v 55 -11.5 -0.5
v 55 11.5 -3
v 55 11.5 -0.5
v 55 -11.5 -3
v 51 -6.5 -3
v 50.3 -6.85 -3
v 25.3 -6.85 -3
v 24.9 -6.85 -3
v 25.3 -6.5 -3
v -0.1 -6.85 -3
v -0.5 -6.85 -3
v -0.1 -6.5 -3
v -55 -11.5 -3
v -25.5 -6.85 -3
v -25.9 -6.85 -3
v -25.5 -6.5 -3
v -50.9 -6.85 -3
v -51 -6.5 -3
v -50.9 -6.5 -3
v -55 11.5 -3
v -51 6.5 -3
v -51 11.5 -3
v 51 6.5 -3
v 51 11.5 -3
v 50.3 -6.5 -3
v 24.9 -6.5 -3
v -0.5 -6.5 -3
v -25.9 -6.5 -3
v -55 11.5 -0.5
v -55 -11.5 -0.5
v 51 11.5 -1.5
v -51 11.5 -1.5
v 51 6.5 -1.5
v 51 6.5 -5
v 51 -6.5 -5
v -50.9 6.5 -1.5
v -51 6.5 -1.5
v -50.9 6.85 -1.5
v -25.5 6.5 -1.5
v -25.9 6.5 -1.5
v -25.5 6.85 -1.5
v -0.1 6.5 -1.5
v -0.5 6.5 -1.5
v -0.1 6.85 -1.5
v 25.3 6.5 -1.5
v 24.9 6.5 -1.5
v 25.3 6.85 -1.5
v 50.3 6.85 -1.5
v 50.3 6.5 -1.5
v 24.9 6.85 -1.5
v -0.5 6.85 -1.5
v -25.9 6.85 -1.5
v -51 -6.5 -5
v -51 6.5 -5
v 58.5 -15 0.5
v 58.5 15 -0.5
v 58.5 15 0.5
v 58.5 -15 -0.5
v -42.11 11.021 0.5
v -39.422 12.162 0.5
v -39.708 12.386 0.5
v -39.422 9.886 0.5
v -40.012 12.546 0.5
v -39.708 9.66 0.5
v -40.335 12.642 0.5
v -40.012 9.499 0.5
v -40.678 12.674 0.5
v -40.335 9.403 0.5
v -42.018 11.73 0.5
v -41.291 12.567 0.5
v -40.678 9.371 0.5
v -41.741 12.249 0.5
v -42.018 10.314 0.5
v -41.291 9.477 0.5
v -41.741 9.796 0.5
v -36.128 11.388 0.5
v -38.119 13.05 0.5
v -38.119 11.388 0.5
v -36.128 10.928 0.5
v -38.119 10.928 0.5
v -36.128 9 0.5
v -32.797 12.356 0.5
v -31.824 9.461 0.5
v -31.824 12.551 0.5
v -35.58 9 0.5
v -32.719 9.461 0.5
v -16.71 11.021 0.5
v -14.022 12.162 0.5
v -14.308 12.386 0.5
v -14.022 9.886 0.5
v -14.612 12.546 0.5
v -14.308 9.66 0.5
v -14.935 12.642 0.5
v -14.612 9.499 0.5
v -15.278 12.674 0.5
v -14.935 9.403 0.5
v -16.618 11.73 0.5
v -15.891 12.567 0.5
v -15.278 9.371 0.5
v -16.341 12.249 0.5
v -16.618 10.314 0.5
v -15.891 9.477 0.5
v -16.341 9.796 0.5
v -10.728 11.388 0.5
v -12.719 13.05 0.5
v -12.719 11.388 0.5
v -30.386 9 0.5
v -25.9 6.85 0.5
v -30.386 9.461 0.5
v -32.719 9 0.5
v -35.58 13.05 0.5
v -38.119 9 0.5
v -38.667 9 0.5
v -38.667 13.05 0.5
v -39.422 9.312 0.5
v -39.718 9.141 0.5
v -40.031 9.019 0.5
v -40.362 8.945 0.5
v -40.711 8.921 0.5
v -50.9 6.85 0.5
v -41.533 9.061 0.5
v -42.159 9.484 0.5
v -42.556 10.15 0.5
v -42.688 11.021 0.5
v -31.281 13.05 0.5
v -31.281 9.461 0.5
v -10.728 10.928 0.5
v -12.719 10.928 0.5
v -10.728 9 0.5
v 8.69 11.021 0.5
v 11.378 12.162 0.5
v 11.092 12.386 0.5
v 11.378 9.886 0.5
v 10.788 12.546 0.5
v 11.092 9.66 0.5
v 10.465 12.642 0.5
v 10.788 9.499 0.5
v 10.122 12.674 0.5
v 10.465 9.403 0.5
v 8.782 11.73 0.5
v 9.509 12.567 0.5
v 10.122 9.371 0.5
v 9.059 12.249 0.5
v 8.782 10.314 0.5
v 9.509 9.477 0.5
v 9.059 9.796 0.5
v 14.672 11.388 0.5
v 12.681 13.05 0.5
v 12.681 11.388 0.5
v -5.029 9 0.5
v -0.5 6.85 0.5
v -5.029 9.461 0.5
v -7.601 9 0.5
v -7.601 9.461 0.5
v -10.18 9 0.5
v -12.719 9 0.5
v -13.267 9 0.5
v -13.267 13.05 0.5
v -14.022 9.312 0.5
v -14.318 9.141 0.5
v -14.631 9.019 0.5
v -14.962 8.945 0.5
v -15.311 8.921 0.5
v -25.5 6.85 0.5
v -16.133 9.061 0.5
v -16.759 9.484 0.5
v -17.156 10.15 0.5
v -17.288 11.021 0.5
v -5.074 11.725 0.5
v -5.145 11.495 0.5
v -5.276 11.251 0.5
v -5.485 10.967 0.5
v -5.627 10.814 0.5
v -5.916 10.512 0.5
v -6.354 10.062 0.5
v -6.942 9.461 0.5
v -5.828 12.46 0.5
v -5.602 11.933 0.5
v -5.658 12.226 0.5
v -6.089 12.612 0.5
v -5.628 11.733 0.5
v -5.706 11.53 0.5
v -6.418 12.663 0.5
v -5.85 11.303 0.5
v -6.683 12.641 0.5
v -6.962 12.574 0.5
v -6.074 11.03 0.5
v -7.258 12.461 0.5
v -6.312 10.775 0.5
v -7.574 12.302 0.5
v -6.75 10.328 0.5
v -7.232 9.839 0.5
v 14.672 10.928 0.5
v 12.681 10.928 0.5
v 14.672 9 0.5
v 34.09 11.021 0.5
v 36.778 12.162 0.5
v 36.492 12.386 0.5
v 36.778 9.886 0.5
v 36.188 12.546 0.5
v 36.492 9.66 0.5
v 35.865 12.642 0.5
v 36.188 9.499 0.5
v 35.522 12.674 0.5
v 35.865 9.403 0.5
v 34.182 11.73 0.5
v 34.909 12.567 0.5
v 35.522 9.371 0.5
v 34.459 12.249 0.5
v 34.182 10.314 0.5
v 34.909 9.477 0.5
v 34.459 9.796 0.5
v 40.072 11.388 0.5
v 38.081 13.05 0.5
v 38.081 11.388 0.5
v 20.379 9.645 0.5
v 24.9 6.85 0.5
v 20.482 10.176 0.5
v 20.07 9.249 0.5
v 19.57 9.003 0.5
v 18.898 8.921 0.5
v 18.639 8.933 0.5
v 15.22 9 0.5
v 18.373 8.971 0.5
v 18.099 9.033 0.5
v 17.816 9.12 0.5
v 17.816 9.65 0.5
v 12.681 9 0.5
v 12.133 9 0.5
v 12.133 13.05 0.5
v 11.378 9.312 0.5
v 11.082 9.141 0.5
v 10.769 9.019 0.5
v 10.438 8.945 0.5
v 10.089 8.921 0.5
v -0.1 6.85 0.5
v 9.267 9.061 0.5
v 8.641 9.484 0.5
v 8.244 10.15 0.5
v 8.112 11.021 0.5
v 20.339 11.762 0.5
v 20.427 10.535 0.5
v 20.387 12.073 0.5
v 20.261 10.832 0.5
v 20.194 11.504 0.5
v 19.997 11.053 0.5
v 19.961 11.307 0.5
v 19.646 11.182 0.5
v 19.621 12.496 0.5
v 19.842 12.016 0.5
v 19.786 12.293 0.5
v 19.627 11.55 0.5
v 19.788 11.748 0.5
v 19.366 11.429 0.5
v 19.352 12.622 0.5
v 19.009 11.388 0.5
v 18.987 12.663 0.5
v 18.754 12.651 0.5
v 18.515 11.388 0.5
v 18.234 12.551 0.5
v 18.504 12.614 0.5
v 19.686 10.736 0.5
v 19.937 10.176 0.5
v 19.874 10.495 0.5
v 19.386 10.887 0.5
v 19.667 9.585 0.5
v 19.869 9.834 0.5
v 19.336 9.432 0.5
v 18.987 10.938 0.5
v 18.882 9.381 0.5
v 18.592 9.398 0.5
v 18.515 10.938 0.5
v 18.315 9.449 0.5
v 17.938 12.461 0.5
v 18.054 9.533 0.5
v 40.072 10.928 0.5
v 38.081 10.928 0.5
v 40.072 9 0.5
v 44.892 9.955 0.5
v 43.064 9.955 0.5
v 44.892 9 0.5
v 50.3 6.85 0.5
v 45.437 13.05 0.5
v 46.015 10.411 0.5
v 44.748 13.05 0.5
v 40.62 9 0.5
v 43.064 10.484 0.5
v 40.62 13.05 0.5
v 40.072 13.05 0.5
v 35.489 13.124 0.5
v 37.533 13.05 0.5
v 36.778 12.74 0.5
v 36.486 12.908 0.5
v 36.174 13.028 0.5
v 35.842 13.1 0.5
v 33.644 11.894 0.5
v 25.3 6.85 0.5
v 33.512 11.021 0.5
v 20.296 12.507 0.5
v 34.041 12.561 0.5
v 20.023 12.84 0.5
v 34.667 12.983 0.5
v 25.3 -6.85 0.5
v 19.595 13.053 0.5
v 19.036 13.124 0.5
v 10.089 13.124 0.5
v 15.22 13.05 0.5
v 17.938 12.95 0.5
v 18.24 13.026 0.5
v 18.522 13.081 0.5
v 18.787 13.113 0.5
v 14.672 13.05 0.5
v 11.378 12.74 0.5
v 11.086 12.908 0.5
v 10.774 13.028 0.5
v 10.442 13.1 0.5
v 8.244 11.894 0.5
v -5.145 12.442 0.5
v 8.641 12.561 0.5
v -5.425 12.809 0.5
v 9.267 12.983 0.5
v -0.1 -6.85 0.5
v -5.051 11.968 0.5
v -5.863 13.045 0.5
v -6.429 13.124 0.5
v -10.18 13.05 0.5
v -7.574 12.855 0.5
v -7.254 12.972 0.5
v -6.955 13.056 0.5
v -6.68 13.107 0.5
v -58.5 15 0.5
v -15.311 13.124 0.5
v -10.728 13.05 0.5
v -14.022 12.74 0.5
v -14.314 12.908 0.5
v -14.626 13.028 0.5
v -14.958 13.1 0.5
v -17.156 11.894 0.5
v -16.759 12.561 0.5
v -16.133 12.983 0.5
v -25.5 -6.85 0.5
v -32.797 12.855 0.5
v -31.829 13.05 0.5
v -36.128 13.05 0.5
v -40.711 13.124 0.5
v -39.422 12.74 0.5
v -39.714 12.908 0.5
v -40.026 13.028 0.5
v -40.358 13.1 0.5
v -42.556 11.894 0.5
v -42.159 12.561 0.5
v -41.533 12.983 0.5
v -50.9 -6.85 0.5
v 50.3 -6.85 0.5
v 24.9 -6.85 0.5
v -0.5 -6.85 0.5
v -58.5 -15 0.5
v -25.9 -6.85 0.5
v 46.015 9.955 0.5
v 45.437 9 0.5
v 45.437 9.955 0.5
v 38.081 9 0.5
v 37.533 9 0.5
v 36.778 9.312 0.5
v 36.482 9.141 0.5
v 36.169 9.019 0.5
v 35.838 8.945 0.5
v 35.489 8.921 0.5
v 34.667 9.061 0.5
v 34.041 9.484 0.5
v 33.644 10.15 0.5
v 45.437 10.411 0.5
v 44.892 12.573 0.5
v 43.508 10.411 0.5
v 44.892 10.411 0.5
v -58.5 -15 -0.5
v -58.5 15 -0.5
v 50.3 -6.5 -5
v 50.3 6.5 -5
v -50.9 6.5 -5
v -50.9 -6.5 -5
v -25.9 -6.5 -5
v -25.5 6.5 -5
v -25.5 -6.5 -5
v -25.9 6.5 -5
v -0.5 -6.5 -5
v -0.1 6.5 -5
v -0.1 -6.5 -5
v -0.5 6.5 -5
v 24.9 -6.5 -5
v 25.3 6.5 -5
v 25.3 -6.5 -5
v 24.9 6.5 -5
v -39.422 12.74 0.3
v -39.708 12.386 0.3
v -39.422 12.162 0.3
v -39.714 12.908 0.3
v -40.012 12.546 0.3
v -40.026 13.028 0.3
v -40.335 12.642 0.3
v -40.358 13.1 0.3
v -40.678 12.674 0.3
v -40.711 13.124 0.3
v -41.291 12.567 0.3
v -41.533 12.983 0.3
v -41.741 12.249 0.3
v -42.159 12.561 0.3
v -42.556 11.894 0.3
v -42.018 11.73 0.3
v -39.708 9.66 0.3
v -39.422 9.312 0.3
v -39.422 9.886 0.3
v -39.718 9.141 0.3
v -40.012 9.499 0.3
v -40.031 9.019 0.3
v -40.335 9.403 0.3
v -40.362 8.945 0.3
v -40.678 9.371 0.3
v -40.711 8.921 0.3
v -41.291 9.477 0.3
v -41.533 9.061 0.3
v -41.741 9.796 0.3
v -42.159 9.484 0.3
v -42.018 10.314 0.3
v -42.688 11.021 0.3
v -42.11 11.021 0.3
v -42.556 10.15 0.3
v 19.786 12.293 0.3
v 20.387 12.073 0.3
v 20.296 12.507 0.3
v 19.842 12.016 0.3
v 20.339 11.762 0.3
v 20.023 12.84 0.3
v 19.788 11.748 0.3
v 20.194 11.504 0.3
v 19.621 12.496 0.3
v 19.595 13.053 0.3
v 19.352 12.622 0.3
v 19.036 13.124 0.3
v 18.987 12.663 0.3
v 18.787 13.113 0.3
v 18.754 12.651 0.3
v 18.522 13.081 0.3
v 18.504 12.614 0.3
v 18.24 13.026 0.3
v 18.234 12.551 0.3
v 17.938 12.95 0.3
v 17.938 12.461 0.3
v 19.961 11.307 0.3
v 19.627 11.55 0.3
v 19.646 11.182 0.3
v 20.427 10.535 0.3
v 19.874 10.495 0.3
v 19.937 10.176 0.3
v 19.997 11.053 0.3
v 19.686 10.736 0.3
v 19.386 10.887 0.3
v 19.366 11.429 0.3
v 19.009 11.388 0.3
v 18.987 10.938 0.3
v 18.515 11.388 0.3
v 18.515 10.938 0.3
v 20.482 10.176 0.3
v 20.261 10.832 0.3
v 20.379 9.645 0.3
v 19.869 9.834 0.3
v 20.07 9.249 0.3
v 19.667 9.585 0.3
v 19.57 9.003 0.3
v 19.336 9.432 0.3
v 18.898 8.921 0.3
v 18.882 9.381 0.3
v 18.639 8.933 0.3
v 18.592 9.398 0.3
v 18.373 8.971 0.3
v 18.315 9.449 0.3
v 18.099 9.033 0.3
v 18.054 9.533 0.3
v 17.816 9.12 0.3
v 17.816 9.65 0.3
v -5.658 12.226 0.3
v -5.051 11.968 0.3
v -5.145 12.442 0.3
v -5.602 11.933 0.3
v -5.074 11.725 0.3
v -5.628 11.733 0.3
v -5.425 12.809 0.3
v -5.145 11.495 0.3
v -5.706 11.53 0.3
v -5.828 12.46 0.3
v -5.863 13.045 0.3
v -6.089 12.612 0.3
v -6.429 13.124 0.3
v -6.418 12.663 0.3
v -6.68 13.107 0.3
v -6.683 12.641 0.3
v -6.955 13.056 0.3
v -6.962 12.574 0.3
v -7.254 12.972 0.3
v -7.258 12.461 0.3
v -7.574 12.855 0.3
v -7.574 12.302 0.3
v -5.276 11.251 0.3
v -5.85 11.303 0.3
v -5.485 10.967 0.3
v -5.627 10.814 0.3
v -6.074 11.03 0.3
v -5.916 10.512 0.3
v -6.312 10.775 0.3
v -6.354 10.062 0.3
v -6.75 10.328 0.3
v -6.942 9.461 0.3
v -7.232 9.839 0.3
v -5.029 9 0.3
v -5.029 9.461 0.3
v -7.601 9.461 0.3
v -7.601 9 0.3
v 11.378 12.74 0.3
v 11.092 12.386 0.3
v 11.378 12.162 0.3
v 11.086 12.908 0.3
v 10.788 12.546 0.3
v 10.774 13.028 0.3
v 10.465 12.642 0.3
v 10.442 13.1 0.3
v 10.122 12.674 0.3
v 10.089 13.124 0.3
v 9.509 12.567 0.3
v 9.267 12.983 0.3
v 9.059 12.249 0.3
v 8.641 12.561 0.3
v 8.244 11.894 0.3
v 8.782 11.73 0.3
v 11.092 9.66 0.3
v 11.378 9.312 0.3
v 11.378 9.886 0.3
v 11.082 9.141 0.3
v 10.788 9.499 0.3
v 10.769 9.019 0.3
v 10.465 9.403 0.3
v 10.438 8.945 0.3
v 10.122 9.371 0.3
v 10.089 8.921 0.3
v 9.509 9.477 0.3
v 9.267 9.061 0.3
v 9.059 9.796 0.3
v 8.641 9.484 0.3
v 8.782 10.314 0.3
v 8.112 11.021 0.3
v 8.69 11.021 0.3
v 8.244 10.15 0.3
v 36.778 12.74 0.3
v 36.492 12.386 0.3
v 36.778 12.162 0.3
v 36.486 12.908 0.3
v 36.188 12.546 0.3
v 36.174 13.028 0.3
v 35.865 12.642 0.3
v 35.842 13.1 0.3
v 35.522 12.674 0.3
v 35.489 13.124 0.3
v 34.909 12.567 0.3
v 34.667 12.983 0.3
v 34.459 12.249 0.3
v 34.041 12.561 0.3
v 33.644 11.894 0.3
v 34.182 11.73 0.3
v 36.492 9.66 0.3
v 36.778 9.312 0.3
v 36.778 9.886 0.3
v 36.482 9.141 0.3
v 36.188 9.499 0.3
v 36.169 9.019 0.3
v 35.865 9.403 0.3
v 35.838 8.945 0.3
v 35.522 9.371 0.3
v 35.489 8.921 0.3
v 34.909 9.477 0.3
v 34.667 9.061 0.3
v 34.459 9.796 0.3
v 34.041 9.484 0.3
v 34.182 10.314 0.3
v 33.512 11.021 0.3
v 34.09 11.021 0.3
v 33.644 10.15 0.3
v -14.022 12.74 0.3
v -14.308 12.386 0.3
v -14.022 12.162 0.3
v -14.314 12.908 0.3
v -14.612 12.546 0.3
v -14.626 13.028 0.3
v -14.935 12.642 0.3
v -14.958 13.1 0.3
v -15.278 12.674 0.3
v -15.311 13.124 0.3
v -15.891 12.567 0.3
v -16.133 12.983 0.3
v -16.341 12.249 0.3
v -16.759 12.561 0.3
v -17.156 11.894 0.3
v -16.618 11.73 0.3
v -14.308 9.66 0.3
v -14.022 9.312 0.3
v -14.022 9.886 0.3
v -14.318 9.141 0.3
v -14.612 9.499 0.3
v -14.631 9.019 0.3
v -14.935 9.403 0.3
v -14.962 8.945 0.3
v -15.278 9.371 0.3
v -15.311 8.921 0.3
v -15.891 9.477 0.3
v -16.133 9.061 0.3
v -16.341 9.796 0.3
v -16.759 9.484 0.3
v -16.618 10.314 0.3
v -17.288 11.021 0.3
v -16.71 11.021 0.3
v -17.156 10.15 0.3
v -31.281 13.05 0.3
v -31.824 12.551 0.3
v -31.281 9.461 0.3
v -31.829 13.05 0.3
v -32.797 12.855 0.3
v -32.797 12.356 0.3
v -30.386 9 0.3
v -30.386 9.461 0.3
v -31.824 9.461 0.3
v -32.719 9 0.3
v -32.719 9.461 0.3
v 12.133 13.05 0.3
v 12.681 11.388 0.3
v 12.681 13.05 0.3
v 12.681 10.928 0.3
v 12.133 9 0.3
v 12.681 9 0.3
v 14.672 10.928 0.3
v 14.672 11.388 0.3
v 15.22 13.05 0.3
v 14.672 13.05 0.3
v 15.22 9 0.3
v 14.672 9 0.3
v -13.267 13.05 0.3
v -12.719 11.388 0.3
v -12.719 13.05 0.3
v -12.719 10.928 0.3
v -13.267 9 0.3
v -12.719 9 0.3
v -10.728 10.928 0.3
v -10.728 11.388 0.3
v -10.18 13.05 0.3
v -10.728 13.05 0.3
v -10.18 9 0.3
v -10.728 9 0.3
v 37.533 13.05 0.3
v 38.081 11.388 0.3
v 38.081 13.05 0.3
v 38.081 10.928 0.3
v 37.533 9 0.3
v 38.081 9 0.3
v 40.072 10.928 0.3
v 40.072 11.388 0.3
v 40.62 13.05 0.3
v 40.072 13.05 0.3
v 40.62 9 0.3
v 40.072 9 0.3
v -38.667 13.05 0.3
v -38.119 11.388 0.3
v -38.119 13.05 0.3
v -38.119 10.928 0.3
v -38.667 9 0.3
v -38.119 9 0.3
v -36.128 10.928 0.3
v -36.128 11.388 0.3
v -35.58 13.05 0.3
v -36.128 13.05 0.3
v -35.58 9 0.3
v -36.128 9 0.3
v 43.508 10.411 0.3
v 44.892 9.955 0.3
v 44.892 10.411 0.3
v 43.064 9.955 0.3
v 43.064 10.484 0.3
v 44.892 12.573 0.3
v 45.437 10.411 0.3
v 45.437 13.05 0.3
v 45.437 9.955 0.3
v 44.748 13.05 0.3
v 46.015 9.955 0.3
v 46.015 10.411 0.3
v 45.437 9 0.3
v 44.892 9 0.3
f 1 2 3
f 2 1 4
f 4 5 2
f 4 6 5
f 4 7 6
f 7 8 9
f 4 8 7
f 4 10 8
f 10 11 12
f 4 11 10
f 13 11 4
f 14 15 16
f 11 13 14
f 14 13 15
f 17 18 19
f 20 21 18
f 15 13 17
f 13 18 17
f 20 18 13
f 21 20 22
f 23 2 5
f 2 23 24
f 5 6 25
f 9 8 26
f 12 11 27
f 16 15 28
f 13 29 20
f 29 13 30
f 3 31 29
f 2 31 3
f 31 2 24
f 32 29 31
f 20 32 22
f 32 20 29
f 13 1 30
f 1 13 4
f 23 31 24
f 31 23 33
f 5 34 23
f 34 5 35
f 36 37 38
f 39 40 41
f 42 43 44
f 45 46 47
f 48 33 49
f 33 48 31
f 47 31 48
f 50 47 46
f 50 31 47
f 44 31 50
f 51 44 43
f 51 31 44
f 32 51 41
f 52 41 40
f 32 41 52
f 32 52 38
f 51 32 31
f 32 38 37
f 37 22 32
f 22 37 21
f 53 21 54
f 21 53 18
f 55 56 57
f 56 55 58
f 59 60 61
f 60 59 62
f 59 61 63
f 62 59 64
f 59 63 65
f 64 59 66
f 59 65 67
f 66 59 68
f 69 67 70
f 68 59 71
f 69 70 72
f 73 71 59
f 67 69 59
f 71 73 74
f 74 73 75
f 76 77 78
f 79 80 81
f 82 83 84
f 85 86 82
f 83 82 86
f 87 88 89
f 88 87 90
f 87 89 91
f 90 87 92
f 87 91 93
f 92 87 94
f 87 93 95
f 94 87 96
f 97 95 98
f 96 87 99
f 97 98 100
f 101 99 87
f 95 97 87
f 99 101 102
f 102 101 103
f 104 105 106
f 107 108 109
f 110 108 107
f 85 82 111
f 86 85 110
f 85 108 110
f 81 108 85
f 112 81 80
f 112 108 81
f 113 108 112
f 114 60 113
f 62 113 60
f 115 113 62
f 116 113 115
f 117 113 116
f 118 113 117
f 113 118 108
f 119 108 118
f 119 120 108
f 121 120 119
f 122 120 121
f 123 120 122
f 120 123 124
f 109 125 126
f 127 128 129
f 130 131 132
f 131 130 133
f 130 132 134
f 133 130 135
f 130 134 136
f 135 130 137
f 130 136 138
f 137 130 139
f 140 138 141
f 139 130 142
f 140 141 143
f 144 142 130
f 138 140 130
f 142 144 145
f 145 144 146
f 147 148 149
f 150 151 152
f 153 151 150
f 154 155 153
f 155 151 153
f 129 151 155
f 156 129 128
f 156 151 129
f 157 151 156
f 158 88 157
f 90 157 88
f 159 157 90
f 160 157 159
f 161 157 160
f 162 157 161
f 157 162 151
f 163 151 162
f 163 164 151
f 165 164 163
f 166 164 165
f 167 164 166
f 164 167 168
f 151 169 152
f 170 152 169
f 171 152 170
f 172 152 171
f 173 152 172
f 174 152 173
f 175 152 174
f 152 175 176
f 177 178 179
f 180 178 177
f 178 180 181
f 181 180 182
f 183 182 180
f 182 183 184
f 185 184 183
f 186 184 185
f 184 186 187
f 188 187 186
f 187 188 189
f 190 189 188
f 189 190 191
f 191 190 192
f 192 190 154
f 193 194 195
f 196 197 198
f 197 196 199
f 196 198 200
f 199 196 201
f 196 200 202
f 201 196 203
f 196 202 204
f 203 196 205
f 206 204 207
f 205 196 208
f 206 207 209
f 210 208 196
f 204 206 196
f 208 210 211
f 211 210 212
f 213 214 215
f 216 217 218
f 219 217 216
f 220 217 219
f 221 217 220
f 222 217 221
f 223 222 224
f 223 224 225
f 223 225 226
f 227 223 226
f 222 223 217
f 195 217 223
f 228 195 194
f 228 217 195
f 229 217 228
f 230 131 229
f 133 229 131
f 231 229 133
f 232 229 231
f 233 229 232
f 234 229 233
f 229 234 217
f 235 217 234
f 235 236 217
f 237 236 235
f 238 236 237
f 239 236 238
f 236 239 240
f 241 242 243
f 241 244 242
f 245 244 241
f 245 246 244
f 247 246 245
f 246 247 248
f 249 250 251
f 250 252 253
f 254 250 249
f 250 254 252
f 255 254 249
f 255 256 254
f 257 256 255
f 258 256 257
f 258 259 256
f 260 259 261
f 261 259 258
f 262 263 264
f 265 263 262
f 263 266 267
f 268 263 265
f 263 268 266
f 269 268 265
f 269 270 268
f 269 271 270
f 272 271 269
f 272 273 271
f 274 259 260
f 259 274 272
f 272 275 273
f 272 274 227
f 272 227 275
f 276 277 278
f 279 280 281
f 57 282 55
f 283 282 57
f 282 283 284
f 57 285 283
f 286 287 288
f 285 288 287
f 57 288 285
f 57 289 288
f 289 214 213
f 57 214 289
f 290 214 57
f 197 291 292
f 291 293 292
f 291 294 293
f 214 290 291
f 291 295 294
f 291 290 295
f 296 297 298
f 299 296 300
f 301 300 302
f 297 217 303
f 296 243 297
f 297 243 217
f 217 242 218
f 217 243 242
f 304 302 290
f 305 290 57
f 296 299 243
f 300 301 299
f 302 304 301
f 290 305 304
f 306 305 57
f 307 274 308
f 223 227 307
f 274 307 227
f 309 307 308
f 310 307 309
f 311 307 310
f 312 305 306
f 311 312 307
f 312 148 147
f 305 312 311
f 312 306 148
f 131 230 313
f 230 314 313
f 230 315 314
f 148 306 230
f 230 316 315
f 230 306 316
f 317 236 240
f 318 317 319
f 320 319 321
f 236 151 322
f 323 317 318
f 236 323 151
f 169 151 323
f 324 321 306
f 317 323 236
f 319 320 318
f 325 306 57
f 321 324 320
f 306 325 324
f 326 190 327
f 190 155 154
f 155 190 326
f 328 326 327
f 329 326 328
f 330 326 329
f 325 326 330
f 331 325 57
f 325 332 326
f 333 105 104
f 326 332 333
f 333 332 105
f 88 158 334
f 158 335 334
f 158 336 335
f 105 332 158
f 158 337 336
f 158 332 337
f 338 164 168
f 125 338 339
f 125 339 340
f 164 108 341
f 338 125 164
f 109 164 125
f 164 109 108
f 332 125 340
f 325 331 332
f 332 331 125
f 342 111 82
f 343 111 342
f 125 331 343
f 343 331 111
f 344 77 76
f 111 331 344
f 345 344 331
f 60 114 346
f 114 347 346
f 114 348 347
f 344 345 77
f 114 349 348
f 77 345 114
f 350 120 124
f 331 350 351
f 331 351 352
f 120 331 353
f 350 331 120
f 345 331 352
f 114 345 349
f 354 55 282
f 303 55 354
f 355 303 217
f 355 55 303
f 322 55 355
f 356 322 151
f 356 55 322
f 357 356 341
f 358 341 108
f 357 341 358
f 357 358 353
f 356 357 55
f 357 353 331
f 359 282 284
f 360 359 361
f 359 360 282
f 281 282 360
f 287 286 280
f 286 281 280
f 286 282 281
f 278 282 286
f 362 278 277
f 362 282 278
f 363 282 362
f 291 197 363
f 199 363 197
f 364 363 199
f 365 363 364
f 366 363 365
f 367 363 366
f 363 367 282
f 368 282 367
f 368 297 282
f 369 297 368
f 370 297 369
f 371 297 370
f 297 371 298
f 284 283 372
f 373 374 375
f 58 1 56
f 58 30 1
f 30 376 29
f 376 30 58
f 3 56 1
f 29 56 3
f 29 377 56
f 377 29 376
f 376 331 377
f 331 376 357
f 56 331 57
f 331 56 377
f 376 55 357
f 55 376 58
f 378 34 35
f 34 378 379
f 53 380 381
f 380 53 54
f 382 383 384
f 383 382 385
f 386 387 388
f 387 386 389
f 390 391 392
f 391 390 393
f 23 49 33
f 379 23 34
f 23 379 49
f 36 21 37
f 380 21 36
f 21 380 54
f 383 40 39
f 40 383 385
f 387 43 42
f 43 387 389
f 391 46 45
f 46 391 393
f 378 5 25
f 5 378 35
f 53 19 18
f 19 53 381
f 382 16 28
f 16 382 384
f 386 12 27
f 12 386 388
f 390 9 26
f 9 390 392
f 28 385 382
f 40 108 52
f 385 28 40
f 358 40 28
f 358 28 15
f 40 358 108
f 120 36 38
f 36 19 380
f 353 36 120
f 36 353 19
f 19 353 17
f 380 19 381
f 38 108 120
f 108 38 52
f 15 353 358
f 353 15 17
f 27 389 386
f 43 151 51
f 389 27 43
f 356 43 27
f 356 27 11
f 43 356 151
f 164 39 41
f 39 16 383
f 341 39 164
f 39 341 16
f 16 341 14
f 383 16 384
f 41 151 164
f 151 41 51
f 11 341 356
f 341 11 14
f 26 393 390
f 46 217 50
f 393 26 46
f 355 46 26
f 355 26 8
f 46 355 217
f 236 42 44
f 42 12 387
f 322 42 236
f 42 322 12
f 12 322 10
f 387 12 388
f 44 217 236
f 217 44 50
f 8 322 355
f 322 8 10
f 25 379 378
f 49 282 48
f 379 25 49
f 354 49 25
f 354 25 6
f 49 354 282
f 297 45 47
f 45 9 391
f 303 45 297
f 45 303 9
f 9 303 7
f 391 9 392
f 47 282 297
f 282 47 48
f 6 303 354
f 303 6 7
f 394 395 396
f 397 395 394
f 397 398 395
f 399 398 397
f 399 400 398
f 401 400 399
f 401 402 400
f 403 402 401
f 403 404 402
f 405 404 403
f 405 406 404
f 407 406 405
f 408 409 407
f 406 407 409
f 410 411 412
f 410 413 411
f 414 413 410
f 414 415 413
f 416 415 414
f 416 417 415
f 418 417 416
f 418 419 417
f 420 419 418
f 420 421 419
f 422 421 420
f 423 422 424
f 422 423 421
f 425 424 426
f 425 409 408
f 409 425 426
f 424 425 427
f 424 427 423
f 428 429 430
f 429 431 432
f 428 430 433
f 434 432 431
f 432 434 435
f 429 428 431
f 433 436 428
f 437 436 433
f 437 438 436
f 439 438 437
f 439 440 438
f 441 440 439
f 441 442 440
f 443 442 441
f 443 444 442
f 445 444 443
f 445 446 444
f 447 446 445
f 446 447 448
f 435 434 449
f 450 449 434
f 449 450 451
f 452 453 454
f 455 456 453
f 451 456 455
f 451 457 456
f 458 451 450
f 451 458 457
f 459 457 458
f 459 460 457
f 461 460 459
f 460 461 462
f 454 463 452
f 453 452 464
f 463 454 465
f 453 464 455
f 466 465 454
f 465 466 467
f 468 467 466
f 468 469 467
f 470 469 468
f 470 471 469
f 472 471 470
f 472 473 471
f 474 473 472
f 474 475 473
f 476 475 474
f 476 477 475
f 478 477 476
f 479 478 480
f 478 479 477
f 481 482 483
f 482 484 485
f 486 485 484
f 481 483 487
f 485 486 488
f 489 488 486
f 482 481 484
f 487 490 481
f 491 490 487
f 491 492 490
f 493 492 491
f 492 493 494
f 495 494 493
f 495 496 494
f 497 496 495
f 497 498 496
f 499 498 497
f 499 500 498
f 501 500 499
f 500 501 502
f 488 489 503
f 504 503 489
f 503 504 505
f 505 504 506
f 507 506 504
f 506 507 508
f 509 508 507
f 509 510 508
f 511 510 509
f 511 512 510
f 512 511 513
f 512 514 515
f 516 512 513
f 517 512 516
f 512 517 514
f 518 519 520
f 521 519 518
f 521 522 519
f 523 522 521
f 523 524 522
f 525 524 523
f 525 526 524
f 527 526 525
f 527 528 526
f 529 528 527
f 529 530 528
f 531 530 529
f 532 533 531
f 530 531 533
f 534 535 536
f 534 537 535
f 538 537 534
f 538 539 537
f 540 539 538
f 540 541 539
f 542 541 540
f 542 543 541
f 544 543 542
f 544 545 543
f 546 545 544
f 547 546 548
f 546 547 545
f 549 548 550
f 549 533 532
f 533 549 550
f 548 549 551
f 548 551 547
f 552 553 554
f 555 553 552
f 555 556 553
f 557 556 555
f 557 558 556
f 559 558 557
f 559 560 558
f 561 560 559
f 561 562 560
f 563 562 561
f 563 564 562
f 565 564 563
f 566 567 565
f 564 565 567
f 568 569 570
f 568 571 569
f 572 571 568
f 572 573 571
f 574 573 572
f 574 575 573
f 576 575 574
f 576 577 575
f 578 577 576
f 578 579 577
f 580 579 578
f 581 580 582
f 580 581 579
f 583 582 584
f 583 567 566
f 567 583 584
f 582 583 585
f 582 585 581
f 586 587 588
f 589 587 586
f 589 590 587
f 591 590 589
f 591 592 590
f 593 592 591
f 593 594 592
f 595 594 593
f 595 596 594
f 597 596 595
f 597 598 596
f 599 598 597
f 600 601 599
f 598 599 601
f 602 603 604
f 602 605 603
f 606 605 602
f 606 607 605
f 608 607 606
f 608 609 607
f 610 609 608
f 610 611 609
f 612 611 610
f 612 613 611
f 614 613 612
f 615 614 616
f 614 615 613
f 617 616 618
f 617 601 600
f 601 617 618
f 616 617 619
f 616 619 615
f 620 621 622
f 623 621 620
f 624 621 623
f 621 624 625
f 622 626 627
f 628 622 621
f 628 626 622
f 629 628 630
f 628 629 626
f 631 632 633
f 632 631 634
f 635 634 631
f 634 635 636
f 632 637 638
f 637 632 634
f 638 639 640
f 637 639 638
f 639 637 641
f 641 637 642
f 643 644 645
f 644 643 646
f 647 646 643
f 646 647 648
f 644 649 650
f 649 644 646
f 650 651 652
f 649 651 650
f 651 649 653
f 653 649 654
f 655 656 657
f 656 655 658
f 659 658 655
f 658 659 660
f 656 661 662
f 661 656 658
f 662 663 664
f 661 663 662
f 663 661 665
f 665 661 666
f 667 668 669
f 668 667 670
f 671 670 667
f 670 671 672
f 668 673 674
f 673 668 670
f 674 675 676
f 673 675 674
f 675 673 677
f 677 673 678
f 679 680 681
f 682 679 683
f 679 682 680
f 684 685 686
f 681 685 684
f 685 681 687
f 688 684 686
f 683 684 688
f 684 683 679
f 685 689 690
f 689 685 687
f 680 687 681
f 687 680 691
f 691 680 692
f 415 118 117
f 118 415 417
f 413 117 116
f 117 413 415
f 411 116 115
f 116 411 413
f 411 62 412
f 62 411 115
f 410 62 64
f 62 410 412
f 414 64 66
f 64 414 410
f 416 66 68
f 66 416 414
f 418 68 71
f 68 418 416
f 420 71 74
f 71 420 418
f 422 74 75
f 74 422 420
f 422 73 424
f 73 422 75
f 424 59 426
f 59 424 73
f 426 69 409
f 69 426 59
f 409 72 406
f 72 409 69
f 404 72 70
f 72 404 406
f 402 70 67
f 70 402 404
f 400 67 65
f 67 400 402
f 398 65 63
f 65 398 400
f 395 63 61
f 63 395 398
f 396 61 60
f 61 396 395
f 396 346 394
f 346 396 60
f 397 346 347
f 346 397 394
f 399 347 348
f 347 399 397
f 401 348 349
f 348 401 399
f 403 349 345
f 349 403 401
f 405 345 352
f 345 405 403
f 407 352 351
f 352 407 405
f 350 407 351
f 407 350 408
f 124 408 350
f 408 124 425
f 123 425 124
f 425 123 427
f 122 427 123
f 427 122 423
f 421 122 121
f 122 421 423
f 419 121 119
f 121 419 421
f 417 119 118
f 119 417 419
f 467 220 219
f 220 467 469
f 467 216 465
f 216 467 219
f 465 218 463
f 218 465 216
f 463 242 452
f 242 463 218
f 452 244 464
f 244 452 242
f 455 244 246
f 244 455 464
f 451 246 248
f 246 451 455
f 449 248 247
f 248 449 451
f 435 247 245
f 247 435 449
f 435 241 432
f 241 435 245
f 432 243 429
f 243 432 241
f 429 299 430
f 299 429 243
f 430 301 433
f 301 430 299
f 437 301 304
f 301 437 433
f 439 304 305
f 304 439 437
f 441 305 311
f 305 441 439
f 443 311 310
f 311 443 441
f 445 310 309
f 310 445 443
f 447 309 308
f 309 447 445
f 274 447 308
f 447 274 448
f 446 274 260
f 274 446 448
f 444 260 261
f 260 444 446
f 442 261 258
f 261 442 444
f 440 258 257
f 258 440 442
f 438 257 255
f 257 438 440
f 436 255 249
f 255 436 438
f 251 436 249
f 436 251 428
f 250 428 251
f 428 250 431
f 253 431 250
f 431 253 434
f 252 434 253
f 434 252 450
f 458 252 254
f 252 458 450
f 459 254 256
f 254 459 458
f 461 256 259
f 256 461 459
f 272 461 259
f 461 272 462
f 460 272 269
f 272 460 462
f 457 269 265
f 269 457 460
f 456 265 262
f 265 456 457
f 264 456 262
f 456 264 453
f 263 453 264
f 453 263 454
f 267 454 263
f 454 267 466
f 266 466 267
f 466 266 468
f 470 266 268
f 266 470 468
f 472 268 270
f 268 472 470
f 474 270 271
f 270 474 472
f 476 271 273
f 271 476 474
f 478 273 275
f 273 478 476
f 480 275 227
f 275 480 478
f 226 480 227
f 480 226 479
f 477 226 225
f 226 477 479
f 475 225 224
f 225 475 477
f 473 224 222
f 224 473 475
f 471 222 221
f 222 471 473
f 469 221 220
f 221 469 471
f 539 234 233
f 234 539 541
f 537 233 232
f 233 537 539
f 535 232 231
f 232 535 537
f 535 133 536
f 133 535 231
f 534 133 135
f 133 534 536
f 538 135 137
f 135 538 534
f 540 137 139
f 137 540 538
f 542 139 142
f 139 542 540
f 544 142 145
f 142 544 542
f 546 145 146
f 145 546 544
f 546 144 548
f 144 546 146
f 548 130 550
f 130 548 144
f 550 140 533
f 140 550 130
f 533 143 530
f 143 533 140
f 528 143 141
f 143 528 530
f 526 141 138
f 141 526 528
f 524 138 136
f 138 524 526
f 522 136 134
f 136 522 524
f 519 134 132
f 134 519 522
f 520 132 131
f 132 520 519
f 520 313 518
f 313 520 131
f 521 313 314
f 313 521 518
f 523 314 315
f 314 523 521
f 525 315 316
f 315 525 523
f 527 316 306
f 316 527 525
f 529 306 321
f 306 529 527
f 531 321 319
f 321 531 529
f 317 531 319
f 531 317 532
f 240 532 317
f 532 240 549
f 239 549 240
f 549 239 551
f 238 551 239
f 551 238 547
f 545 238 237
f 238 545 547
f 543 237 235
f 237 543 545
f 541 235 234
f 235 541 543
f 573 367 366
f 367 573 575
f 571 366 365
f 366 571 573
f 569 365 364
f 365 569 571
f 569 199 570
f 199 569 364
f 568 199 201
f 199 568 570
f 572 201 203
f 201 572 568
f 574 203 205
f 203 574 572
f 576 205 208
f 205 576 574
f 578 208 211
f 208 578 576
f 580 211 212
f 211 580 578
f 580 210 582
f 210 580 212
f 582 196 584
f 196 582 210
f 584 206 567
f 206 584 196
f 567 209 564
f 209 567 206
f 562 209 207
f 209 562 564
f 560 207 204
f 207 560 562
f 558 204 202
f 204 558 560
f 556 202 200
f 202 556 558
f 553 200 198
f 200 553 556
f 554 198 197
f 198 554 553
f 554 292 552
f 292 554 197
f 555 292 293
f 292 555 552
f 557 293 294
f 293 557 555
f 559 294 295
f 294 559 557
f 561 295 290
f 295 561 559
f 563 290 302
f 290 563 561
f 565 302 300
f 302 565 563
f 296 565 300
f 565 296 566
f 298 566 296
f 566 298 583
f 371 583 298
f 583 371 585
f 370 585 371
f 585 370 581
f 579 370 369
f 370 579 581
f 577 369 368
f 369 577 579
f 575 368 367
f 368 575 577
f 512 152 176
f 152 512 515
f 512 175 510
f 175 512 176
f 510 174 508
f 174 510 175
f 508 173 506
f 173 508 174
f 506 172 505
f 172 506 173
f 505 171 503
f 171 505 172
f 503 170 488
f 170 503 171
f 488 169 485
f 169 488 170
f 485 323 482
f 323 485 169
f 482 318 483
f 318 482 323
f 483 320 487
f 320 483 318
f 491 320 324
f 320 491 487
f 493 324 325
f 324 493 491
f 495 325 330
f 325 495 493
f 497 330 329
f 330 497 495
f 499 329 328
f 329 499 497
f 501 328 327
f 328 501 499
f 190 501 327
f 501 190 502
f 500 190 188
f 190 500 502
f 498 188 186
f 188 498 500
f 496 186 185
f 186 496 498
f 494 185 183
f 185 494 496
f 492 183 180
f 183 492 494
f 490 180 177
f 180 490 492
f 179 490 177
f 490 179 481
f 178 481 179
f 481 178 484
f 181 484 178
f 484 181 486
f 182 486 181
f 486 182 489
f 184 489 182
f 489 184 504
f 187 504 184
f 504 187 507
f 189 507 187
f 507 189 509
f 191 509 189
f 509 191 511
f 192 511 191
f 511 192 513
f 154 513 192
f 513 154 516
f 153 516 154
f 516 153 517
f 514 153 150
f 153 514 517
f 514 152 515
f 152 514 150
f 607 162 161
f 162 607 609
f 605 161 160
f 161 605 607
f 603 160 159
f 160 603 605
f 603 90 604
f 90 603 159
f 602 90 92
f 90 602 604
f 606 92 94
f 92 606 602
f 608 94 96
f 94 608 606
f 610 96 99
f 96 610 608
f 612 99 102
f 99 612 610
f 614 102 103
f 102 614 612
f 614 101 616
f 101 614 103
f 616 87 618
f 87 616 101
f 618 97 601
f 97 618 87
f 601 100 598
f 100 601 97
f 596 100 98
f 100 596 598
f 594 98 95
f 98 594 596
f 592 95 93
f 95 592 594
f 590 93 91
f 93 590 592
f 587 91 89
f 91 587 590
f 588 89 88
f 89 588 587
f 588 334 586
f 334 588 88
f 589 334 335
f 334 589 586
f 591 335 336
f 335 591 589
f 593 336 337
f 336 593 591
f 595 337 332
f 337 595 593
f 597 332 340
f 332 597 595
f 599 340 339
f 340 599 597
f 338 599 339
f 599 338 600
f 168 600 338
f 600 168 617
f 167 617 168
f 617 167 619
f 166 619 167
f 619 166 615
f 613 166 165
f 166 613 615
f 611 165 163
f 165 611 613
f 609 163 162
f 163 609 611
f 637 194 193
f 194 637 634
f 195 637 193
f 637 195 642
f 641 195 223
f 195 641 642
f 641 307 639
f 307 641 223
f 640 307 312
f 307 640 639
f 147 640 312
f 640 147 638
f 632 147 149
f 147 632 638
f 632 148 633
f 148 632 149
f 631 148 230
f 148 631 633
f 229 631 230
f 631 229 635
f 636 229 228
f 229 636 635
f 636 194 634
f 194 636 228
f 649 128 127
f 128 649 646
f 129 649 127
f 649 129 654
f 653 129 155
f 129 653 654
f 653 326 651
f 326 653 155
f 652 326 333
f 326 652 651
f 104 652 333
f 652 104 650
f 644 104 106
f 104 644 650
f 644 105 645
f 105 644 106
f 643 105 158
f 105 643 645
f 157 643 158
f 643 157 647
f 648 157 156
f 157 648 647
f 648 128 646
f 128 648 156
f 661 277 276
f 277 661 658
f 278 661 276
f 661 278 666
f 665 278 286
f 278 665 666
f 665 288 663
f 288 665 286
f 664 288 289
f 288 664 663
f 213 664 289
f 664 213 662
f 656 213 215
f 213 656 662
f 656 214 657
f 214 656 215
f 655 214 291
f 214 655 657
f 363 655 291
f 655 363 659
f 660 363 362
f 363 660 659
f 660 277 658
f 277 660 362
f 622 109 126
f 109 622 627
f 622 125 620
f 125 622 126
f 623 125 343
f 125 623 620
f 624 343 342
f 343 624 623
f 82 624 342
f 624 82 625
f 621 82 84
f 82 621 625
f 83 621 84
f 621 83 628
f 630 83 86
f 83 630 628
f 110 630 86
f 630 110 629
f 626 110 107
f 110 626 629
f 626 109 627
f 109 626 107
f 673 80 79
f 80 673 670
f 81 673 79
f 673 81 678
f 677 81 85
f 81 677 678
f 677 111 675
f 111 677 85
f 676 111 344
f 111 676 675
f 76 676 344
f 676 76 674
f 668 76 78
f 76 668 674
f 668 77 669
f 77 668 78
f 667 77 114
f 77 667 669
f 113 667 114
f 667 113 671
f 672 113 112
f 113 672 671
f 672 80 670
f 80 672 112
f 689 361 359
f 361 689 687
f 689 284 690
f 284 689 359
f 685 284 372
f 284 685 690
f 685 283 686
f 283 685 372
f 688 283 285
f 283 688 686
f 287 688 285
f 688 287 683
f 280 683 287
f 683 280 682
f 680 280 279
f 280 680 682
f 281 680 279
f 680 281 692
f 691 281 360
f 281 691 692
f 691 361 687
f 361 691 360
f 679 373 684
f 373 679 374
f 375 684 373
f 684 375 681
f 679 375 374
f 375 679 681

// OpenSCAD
dispW = 25;
dispH = 13.7;

dispYoff = 0;

holeW = 110;
holeH = 23;

dist = 2.54 * 10;

kragenOut = 7;
thicknessOut = 1;

kragenIn = 2;
thicknessIn = 1;
stegWidth = 2;


borderW = holeW + kragenOut;
borderH = holeH + kragenOut;

depth = 3;
    //font();
difference() {
    main();
    font();
}




module font() {
    startx = -43;
    font="Bahnschrift";
    translate([0,-0.5,0.3]) linear_extrude(0.2) {
        translate([startx,9.5,0]) text("CH 1", size=4, font=font);
        translate([startx + dist,9.5,0]) text("CH 2", size=4, font=font);
        translate([startx + dist * 2,9.5,0]) text("CH 3", size=4, font=font);
        translate([startx + dist * 3,9.5,0]) text("CH 4", size=4,font=font);
    }
}



module main() {
    difference() {
        union() {
            cube([borderW, borderH, thicknessOut], true);
            translate([0,0,-2.5]) cube([102, 13, 5], true);
            difference() {
                translate([0,0,-depth/2]) cube([holeW, holeH, depth], true);        
                translate([0,16,-3]) cube([102,20,3],true);
            }    }
        translate([-dist/2-+dispW,0,0]) displayCut();
    }
}

module displayCut() {
    for(i=[0:1:3]) {
        translate([-0.7 + i * dist, 0, 0]) cube([dispW, dispH, 50], true);
    }
}
